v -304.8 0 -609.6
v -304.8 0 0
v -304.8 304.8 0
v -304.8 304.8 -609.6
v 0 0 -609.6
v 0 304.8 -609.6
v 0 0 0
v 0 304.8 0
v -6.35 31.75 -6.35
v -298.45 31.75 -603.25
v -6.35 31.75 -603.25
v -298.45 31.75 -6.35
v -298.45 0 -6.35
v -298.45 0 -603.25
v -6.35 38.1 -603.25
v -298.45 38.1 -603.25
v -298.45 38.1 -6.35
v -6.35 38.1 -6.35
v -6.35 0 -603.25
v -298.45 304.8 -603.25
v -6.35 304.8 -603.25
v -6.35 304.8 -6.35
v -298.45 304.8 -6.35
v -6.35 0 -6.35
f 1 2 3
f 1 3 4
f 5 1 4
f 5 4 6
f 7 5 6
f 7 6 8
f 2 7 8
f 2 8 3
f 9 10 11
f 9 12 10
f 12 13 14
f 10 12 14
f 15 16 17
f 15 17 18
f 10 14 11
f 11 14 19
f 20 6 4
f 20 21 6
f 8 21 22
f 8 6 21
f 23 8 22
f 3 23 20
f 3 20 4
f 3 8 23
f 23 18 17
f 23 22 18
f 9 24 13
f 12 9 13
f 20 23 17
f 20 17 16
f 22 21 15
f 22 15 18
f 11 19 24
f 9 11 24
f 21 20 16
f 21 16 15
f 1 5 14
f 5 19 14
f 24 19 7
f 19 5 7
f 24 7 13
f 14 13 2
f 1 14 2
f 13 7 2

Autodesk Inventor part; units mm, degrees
ref_plane "YZ Plane" through (0, 0, 0) normal (1, 0, 0) x (0, 1, 0)
ref_plane "XZ Plane" through (0, 0, 0) normal (0, 1, 0) x (-1, 0, 0)
ref_plane "XY Plane" through (0, 0, 0) normal (0, 0, 1) x (1, 0, 0)
sketch "Sketch1" plane through (0, 0, 0) normal (0, 1, 0) x (-1, 0, 0)
  line L0 (0, 0) -> (304.8, 0)
  line L1 (304.8, 0) -> (304.8, -609.6)
  line L2 (304.8, -609.6) -> (0, -609.6)
  line L3 (0, -609.6) -> (0, 0)
  dimension "d0" = 304.8
  dimension "d1" = 609.6
extrude "Extrusion1" add sketch "Sketch1" along normal blind 304.8
sketch "Sketch2" plane through (0, 304.8, 0) normal (0, 1, 0) x (1, 0, 0)
  line L0 (-298.45, 603.25) -> (-6.35, 603.25)
  line L1 (-6.35, 603.25) -> (-6.35, 6.35)
  line L2 (-6.35, 6.35) -> (-298.45, 6.35)
  line L3 (-298.45, 6.35) -> (-298.45, 603.25)
  line L4 (0, 0) -> (0, 609.6) projected
  line L5 (-304.8, 609.6) -> (-304.8, 0) projected
  line L6 (-304.8, 0) -> (0, 0) projected
  line L7 (0, 609.6) -> (-304.8, 609.6) projected
  dimension "d4" = 6.35
  dimension "d5" = 6.35
  dimension "d6" = 6.35
  dimension "d7" = 6.35
extrude "Extrusion2" cut sketch "Sketch2" against normal blind 266.7 contours L0 L1 L2 L3
sketch "Sketch3" plane through (0, 0, 0) normal (0, -1, 0) x (1, 0, 0)
  line L0 (-298.45, -6.35) -> (-298.45, -603.25) projected
  line L1 (-6.35, -6.35) -> (-298.45, -6.35)
  line L2 (-298.45, -6.35) -> (-298.45, -603.25)
  line L3 (-298.45, -603.25) -> (-6.35, -603.25)
  line L4 (-6.35, -603.25) -> (-6.35, -6.35)
  line L5 (0, 0) -> (0, -609.6) projected
  line L6 (-304.8, 0) -> (0, 0) projected
  dimension "d10" = 6.35
  dimension "d11" = 6.35
extrude "Extrusion3" cut sketch "Sketch3" against normal blind 31.75
properties part number "Cargo Container"
